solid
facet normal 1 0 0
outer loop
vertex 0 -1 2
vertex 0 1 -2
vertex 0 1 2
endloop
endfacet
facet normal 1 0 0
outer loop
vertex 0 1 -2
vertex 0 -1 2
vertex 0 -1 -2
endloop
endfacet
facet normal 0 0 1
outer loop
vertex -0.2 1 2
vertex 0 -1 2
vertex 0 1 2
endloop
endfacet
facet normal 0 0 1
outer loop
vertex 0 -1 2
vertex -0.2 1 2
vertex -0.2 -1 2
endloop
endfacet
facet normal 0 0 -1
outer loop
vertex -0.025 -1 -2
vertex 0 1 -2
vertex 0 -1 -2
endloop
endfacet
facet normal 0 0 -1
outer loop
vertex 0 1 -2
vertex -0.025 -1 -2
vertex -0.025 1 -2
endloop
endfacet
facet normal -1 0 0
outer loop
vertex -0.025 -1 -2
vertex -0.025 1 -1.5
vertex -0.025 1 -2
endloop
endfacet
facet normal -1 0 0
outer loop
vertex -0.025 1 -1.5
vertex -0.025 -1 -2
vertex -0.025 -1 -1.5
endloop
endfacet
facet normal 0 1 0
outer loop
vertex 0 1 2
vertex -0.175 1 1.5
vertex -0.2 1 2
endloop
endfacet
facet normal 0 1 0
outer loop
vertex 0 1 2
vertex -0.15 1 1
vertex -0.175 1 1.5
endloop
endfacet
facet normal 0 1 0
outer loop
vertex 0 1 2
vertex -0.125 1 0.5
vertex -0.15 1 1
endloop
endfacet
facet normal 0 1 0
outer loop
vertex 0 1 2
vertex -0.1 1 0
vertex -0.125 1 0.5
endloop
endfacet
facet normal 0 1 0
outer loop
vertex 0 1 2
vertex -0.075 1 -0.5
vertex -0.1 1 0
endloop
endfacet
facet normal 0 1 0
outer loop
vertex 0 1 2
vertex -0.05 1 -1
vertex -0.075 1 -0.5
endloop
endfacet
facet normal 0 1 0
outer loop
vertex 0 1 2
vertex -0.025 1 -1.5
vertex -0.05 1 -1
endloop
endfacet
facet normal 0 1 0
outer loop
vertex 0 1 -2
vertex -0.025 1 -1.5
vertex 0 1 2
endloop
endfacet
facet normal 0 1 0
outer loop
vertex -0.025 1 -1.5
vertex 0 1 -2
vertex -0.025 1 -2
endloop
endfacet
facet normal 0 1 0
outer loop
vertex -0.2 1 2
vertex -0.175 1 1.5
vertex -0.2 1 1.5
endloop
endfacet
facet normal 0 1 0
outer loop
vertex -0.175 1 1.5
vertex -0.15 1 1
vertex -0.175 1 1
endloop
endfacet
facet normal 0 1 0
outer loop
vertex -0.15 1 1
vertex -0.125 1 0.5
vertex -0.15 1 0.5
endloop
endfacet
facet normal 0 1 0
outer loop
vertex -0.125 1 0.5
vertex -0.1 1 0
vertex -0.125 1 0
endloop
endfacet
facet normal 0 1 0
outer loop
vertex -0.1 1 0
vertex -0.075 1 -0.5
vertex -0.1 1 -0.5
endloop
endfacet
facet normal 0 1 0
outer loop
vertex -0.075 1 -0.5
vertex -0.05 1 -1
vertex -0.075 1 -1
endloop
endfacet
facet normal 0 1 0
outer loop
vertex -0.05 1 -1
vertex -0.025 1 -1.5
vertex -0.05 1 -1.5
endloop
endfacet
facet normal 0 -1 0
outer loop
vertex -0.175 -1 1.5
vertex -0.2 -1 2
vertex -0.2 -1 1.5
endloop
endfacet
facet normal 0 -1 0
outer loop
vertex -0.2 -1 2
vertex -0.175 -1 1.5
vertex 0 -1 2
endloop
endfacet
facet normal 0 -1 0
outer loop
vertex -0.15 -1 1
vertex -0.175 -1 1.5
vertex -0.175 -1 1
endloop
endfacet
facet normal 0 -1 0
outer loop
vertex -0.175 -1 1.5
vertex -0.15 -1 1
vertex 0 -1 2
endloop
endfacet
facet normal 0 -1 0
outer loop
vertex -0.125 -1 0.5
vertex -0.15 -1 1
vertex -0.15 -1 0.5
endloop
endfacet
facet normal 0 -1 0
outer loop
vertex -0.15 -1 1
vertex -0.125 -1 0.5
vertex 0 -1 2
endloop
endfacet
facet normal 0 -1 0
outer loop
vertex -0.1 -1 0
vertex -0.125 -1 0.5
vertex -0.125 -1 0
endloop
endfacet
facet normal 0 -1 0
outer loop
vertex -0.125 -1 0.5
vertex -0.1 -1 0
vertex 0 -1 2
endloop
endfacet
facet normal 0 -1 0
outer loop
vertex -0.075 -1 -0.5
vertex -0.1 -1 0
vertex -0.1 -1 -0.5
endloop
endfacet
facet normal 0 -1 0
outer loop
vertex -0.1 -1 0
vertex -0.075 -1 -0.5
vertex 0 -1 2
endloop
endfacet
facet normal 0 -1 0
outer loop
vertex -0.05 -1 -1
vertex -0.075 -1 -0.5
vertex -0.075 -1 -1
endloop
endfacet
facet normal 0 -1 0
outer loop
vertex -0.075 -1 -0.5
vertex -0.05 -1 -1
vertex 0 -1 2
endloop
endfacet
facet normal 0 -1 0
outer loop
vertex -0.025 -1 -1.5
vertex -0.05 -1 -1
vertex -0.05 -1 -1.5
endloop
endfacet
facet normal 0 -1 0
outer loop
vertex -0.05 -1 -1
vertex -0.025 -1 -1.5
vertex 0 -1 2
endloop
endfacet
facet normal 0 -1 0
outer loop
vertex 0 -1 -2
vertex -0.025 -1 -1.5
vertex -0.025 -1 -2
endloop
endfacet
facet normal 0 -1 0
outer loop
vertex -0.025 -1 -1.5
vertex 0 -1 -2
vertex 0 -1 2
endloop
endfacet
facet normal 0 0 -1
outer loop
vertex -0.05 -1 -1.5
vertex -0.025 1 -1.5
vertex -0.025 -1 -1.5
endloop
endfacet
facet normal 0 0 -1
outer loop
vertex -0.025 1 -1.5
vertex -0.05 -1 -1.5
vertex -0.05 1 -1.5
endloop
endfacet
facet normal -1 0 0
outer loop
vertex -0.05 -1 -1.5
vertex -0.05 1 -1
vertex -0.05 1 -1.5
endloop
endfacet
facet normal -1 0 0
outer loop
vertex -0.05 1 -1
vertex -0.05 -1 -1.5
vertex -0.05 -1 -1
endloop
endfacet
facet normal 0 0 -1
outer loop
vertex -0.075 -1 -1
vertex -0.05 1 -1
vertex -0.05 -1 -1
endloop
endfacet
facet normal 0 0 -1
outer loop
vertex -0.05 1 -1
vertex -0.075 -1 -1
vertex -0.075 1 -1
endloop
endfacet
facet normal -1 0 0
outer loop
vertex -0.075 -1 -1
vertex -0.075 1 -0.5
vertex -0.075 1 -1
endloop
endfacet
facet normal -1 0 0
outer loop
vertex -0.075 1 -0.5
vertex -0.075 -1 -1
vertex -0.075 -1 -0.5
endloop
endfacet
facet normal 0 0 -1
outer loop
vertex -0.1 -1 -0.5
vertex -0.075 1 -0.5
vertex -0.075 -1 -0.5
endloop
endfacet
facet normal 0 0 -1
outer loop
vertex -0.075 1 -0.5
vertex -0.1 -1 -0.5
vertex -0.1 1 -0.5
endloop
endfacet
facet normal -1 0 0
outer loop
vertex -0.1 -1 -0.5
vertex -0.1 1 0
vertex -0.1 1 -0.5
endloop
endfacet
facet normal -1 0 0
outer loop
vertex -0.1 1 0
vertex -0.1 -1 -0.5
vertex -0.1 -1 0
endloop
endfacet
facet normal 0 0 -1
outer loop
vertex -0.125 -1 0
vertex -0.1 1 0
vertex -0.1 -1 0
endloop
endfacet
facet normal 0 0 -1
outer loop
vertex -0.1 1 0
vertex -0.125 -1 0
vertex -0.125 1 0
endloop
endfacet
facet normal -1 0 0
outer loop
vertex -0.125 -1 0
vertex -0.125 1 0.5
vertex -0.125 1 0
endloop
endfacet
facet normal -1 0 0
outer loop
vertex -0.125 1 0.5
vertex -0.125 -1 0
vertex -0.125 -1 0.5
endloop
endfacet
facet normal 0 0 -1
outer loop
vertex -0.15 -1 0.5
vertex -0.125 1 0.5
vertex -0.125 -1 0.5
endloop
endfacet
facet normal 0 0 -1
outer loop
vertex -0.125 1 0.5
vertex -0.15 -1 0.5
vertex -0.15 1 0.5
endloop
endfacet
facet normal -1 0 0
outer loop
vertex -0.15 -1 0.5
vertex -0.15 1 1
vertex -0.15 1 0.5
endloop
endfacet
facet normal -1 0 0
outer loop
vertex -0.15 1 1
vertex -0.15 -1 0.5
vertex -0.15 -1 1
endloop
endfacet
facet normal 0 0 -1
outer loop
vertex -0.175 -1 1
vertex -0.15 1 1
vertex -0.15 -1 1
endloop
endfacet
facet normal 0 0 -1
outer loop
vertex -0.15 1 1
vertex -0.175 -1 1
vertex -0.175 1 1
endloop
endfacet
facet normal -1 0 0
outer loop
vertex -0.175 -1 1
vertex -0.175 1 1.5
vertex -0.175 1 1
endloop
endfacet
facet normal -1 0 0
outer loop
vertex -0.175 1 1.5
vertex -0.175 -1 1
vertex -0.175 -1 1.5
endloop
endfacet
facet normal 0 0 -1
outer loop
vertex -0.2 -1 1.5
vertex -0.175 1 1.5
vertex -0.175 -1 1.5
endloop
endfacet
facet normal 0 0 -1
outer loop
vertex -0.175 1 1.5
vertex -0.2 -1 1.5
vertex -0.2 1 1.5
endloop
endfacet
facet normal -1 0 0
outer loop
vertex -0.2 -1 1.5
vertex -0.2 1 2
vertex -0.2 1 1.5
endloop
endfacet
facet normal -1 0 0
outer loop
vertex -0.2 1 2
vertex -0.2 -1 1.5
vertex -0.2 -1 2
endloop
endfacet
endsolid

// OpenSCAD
dx=0.1; //cm
 scale([0.25,1,1]) union() {
translate([-dx/2,0,0])
    cube([dx,2.0,4.0],center=true);
translate([-3*dx/2,0,0.25])
    cube([dx,2.0,3.5],center=true);
translate([-5*dx/2,0,0.5])
    cube([dx,2.0,3.0],center=true);
translate([-7*dx/2,0,0.75])
    cube([dx,2.0,2.5],center=true);
translate([-9*dx/2,0,1])
    cube([dx,2.0,2.0],center=true);
translate([-11*dx/2,0,1.25])
    cube([dx,2.0,1.5],center=true);
translate([-13*dx/2,0,1.5])
    cube([dx,2.0,1.0],center=true);
translate([-15*dx/2,0,1.75])
    cube([dx,2.0,0.5],center=true);
}
